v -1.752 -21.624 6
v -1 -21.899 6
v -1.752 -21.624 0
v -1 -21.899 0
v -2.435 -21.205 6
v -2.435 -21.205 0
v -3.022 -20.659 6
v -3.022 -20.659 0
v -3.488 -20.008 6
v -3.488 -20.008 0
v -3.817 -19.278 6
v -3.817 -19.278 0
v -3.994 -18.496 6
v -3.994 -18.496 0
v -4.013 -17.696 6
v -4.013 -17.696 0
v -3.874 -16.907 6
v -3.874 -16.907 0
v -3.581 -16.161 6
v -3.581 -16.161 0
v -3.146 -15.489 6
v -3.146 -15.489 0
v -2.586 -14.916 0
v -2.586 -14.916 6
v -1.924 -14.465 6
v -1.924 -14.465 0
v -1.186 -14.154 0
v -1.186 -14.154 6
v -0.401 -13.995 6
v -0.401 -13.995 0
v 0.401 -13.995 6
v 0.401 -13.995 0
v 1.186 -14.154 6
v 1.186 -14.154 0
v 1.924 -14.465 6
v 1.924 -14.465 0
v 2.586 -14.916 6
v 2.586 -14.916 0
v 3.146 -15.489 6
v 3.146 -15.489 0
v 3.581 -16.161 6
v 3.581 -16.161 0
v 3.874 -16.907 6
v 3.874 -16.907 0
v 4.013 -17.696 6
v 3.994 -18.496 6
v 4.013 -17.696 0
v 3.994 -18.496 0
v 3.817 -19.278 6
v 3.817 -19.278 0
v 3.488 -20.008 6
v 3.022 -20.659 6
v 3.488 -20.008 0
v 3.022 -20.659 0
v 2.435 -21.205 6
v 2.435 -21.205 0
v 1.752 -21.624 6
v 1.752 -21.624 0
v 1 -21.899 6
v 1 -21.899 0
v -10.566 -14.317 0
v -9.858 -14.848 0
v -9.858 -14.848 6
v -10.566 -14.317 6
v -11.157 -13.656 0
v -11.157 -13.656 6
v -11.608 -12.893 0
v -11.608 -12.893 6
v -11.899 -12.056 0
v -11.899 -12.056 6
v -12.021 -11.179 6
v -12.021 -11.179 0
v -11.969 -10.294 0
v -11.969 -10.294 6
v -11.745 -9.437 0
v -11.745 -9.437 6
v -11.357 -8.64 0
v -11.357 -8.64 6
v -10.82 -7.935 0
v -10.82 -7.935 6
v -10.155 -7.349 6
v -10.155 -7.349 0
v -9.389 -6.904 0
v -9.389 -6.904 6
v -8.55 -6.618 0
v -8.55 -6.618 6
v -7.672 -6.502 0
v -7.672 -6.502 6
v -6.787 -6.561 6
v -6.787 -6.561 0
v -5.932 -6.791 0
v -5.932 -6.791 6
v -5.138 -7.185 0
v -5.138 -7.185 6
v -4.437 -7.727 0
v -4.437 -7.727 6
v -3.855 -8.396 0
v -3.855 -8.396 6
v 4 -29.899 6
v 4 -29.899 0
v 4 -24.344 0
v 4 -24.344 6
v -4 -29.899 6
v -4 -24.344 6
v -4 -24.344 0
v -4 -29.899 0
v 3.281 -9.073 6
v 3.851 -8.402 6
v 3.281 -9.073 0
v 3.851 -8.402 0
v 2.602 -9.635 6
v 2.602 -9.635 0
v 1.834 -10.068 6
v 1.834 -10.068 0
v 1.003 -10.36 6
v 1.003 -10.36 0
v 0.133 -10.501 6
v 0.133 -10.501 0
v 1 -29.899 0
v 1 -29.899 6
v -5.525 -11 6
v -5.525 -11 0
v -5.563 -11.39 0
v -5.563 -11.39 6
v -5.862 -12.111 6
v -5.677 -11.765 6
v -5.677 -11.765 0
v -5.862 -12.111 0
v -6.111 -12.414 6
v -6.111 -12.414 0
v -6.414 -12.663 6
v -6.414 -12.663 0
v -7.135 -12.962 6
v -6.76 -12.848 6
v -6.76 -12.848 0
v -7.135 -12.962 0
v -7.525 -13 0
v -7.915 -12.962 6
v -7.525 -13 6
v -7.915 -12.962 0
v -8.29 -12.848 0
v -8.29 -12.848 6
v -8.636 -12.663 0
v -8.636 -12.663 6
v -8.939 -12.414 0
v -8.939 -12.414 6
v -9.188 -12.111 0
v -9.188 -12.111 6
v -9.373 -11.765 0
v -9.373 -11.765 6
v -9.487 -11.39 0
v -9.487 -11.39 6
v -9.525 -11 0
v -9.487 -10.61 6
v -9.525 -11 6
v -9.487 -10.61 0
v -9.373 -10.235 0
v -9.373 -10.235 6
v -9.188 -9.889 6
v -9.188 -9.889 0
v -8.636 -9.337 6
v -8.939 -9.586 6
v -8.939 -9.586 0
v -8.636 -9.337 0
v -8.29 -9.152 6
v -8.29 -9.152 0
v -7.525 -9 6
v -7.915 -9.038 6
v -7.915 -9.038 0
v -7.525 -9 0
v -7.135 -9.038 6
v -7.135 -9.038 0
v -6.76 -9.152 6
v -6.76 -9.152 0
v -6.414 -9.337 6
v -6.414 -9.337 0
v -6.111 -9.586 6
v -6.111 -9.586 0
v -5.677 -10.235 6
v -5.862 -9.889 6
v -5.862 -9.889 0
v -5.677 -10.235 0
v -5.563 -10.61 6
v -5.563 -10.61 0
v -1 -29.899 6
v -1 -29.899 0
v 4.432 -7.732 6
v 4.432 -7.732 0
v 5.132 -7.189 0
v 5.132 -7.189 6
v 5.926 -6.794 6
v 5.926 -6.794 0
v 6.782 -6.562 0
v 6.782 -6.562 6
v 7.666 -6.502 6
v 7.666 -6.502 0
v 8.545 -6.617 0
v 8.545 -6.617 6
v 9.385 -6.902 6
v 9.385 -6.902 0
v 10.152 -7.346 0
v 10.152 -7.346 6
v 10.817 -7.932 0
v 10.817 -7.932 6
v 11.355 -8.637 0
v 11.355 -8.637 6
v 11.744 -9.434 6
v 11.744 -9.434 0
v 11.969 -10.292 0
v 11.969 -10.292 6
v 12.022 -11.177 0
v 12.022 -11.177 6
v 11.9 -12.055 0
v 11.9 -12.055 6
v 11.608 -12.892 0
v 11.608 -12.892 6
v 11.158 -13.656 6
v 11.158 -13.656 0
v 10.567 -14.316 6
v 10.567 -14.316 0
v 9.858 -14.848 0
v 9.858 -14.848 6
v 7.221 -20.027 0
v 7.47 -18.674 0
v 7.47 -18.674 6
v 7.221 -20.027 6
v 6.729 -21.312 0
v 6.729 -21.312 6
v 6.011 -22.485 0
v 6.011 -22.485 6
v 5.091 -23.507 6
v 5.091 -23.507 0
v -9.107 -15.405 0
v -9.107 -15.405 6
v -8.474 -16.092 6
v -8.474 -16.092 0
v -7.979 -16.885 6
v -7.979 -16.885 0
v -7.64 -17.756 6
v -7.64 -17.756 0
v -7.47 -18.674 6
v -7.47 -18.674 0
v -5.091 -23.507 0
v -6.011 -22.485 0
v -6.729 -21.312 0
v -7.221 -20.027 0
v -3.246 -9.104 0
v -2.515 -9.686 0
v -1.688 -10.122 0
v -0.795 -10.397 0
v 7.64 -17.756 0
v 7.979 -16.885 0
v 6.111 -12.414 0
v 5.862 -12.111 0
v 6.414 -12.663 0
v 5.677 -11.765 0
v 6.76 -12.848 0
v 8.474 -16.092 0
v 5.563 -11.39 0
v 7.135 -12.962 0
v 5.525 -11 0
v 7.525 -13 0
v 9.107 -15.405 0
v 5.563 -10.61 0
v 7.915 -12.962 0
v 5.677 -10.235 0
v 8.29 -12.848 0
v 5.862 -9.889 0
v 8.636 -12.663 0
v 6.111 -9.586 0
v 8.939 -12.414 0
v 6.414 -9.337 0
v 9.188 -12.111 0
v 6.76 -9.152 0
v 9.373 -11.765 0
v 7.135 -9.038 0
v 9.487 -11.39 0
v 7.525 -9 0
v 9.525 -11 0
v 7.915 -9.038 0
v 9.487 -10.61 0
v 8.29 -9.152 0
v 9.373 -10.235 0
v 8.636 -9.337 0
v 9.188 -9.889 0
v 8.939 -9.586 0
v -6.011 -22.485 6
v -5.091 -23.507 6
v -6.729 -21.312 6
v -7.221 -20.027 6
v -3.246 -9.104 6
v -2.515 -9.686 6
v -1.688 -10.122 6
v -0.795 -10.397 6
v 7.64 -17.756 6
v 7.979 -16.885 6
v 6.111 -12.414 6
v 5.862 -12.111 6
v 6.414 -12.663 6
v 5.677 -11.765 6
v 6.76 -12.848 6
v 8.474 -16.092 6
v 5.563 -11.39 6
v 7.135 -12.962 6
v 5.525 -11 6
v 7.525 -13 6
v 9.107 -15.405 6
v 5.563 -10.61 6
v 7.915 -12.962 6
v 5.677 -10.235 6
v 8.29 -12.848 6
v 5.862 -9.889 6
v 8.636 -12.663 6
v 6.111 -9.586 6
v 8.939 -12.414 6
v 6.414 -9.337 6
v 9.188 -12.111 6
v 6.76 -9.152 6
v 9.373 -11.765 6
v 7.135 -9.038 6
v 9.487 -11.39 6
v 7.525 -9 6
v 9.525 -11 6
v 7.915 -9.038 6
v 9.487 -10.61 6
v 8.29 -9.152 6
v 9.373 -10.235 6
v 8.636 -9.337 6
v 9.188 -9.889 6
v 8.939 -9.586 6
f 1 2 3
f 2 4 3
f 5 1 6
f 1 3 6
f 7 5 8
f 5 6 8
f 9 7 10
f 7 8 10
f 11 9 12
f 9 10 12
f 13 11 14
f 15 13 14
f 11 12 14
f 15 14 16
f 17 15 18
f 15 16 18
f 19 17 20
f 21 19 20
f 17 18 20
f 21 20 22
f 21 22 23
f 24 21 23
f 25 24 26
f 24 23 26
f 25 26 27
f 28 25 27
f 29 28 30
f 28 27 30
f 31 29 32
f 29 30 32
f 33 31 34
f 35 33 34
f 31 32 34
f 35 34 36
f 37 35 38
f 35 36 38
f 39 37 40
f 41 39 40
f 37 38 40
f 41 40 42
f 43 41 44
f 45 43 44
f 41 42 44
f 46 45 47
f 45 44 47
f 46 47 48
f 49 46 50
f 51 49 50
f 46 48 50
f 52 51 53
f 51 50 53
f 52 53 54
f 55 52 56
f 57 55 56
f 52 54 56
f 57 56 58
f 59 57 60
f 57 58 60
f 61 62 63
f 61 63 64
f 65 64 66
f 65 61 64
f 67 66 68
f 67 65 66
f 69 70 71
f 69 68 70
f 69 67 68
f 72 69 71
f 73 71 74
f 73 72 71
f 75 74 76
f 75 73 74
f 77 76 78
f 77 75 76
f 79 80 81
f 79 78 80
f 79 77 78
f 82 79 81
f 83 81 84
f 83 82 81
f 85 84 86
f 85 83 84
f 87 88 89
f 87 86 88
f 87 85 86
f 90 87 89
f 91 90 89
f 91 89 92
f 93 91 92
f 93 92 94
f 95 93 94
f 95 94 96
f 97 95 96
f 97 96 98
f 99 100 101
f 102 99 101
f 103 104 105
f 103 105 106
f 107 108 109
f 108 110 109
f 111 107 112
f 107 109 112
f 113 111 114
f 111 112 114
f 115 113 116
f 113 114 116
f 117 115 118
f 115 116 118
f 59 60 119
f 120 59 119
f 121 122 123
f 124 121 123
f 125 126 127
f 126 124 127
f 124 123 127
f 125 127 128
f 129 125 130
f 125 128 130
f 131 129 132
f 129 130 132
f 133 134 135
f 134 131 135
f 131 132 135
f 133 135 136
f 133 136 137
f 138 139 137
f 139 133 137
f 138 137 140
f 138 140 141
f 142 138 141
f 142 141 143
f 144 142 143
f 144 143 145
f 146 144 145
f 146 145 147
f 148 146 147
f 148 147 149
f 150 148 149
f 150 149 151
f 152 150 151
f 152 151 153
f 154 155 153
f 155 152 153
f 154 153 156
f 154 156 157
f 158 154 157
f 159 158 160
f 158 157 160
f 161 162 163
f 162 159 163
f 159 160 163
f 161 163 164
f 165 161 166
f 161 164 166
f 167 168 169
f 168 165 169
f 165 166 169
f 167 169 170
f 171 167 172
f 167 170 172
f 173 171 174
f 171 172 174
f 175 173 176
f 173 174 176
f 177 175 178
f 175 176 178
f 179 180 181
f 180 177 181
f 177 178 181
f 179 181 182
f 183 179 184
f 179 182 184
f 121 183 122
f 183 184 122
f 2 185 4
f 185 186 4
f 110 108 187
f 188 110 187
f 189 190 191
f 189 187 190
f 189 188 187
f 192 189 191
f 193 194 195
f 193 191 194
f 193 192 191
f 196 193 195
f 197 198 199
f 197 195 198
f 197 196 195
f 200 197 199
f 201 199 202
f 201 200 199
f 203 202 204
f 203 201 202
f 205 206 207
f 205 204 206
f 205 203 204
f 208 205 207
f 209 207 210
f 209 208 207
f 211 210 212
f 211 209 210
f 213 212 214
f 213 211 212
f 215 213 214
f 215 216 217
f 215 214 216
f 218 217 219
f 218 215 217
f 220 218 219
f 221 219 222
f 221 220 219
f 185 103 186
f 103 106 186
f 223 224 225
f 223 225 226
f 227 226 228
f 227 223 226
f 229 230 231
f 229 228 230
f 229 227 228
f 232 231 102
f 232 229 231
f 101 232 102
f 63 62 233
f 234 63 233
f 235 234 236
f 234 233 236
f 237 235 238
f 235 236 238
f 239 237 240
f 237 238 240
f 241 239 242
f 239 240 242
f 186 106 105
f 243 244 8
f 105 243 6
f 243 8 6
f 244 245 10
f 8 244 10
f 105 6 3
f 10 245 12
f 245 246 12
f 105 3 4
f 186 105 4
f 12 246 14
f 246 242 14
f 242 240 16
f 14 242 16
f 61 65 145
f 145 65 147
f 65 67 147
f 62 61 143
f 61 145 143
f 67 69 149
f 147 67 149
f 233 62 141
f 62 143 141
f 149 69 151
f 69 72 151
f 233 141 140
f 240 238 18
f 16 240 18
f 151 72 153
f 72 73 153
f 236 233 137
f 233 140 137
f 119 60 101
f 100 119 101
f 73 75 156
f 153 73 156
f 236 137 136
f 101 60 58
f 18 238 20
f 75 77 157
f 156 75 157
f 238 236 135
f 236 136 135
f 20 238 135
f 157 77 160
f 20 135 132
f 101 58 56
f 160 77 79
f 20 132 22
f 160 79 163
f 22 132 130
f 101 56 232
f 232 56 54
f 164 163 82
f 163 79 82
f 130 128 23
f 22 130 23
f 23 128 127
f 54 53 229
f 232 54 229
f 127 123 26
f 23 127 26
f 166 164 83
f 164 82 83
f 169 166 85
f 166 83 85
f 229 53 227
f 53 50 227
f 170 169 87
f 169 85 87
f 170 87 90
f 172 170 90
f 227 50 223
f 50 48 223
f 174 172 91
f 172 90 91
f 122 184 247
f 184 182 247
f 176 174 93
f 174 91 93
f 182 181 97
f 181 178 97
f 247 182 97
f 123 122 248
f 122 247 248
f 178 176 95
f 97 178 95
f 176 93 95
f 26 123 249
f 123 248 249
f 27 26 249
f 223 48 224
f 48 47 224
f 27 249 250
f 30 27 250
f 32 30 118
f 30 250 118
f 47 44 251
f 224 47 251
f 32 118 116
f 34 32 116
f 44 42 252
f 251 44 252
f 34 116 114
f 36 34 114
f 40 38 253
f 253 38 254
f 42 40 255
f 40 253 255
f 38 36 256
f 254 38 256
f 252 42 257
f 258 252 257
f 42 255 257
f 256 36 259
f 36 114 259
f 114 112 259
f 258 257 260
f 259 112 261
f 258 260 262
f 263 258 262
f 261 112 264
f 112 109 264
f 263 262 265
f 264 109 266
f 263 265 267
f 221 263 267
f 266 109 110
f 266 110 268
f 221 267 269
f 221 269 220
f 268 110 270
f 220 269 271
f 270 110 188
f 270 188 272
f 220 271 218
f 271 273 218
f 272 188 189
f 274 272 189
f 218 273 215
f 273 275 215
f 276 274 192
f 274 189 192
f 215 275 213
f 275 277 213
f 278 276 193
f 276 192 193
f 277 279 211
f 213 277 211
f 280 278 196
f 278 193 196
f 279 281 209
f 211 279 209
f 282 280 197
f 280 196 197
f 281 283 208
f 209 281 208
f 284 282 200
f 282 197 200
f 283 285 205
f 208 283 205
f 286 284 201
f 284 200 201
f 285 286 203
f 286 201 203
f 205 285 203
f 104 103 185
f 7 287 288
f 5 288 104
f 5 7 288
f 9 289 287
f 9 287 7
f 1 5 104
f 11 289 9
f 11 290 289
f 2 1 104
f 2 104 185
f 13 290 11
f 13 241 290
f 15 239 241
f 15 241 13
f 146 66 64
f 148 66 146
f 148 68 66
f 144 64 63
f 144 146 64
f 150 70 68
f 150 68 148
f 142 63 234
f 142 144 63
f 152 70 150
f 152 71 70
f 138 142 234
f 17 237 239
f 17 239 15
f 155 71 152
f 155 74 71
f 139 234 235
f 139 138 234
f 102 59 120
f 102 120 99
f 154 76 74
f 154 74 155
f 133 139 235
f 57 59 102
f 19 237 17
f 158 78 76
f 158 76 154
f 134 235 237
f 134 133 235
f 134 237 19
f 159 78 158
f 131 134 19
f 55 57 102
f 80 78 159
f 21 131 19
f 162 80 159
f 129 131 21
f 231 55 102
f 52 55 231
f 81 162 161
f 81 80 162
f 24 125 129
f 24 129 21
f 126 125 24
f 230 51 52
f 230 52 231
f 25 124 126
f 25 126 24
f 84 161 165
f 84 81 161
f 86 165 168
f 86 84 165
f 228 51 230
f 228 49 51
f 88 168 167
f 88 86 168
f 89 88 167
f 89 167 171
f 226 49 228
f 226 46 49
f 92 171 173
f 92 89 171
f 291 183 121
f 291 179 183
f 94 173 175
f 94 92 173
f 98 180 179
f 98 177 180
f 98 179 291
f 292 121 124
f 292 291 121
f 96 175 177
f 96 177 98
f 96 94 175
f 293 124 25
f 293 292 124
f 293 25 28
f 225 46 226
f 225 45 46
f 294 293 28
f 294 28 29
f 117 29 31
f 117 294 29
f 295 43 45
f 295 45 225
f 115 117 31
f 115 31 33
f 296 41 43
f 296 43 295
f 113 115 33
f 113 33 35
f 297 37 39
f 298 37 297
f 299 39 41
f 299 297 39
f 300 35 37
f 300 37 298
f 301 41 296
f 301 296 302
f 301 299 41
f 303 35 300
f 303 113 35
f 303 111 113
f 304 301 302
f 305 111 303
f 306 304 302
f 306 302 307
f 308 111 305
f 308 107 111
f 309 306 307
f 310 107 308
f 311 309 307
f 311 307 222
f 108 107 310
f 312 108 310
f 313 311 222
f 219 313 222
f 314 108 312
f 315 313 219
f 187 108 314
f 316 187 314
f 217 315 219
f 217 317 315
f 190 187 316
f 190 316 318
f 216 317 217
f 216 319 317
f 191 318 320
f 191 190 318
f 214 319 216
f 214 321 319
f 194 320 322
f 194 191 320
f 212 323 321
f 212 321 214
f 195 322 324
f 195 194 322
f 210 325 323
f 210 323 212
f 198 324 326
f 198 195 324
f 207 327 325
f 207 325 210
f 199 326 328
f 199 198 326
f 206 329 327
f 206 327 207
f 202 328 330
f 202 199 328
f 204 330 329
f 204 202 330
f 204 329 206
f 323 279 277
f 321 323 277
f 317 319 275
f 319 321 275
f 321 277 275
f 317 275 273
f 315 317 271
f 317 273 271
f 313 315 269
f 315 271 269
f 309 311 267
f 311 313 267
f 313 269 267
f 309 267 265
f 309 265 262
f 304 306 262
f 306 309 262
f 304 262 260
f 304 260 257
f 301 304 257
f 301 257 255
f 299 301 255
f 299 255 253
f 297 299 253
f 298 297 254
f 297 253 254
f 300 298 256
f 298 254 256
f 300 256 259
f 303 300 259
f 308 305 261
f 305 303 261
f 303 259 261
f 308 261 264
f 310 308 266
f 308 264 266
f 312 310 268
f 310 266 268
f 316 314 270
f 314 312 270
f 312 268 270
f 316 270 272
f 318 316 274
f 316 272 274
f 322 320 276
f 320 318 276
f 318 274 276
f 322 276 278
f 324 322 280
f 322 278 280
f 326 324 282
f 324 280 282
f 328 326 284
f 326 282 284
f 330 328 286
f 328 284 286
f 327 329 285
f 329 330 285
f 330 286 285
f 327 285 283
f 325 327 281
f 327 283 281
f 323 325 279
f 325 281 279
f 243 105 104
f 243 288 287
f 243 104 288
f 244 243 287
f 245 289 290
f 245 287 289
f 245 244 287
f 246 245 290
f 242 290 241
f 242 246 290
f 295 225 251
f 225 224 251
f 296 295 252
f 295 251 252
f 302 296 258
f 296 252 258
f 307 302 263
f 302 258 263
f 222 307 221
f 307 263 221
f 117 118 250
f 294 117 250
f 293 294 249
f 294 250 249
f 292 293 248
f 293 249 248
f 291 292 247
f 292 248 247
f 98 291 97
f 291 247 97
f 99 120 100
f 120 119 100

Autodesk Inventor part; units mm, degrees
ref_plane "YZ Plane" through (0, 0, 0) normal (1, 0, 0) x (0, 1, 0)
ref_plane "XZ Plane" through (0, 0, 0) normal (0, 1, 0) x (-1, 0, 0)
ref_plane "XY Plane" through (0, 0, 0) normal (0, 0, 1) x (1, 0, 0)
sketch "スケッチ1" plane through (0, 0, 0) normal (0, 0, 1) x (1, 0, 0)
  circle A0 centre (0, 0) radius 4.025
  arc A1 (6.725498, 2.029361) -> (-6.725498, 2.029361) centre (0, 0) ccw
  line L0 (0, -11) -> (0, -19) construction
  line L1 (-3.025, -11) -> (-3.025, -19)
  line L2 (3.025, -19) -> (3.025, -11)
  arc A2 (3.025, -11) -> (-3.025, -11) centre (0, -11) ccw
  arc A3 (-3.025, -19) -> (3.025, -19) centre (0, -19) ccw
  arc A4 (-5.235739, -21.981218) -> (5.235739, -21.981218) centre (0, -19) ccw
  circle A5 centre (-7.525, -11) radius 1.25
  circle A6 centre (7.525, -11) radius 1.25
  line L3 (-7.525, -11) -> (7.525, -11) construction
  arc A7 (-11.411415, -8.73157) -> (-10.923603, -13.949491) centre (-7.525, -11) ccw
  arc A8 (-11.411415, -8.73157) -> (-6.725498, 2.029361) centre (-54.593809, 16.473208) ccw
  arc A9 (6.725498, 2.029361) -> (11.411415, -8.73157) centre (54.593809, 16.473208) ccw
  arc A10 (-5.235739, -21.981218) -> (-10.923603, -13.949491) centre (-48.685856, -46.721617) ccw
  arc A11 (10.923603, -13.949491) -> (5.235739, -21.981218) centre (48.685856, -46.721617) ccw
  arc A12 (10.923603, -13.949491) -> (11.411415, -8.73157) centre (7.525, -11) ccw
  point P0 (0, -15)
  dimension "d0" = 8.05
  dimension "d1" = 3
  dimension "d2" = 8
  dimension "d3" = 6.05
  dimension "d4" = 19
  dimension "d5" = 2.5
  dimension "d6" = 2.5
  dimension "d7" = 9
  dimension "d8" = 100
  dimension "d9" = 100
  dimension "d10" = 50
  dimension "d11" = 50
  dimension "d12" = 4.5
  dimension "d13" = 3
sketch "スケッチ2" plane through (0, 0, 0) normal (0, 0, 1) x (1, 0, 0)
  circle A0 centre (-7.525, -11) radius 1.25 construction
  circle A1 centre (7.525, -11) radius 1.25 construction
  circle A2 centre (-7.525, -11) radius 2
  circle A3 centre (7.525, -11) radius 2
  arc A4 (-3.027118, -11.138035) -> (-7.062601, -15.47618) centre (-7.525, -11) ccw
  arc A5 (7.062601, -15.47618) -> (3.027118, -11.138035) centre (7.525, -11) ccw
  arc A6 (1, -21.898798) -> (-1, -21.898798) centre (0, -18) ccw
  line L0 (0, 0) -> (0, -18) construction
  line L1 (-1, -21.898798) -> (-1, -29.898798)
  line L2 (1, -21.898798) -> (1, -29.898798)
  line L3 (1, -29.898798) -> (4, -29.898798)
  line L4 (4, -29.898798) -> (4, -24.344289)
  line L5 (-1, -29.898798) -> (-4, -29.898798)
  line L6 (-4, -29.898798) -> (-4, -24.344289)
  arc A7 (-7.062601, -15.47618) -> (-4, -24.344289) centre (0, -18) ccw
  arc A8 (4, -24.344289) -> (7.062601, -15.47618) centre (0, -18) ccw
  arc A9 (3.027118, -11.138035) -> (-3.027118, -11.138035) centre (0, -18) ccw
  dimension "d14" = 4
  dimension "d15" = 4
  dimension "d16" = 9
  dimension "d17" = 9
  dimension "d18" = 8.05
  dimension "d19" = 18
  dimension "d20" = 8
  dimension "d21" = 8
  dimension "d22" = 2
  dimension "d23" = 1
  dimension "d24" = 3
  dimension "d25" = 3
  dimension "d27" = 7.5
  dimension "d28" = 7.5
  dimension "d29" = 7.5
sketch "スケッチ2 outline for 押し出し1" plane through (0, 0, 0) normal (0, 0, 1) x (1, 0, 0)
  line L0 (-1, -29.898798) -> (-1, -21.898798)
  line L1 (-4, -29.898798) -> (-1, -29.898798)
  arc A0 (-1, -21.898798) -> (1, -21.898798) centre (0, -18) cw
  line L2 (-4, -24.344289) -> (-4, -29.898798)
  line L3 (1, -21.898798) -> (1, -29.898798)
  arc A1 (-7.062601, -15.47618) -> (-4, -24.344289) centre (0, -18) ccw
  line L4 (1, -29.898798) -> (4, -29.898798)
  arc A2 (-3.027118, -11.138035) -> (-7.062601, -15.47618) centre (-7.525, -11) ccw
  line L5 (4, -29.898798) -> (4, -24.344289)
  arc A3 (3.027118, -11.138035) -> (-3.027118, -11.138035) centre (0, -18) ccw
  arc A4 (4, -24.344289) -> (7.062601, -15.47618) centre (0, -18) ccw
  arc A5 (7.062601, -15.47618) -> (3.027118, -11.138035) centre (7.525, -11) ccw
  circle A6 centre (-7.525, -11) radius 2
  circle A7 centre (7.525, -11) radius 2
extrude "押し出し1" add sketch "スケッチ2 outline for 押し出し1" along normal blind 6
fillet "フィレット1" radius 5 4 edges at (-3.0271, -11.138, 3) (3.0271, -11.138, 3) (7.0626, -15.4762, 3) (-7.0626, -15.4762, 3)
equation "\"d21\" = d20"
properties part number "横回転棒取り付けパーツ" material "アルミニウム 7075"
